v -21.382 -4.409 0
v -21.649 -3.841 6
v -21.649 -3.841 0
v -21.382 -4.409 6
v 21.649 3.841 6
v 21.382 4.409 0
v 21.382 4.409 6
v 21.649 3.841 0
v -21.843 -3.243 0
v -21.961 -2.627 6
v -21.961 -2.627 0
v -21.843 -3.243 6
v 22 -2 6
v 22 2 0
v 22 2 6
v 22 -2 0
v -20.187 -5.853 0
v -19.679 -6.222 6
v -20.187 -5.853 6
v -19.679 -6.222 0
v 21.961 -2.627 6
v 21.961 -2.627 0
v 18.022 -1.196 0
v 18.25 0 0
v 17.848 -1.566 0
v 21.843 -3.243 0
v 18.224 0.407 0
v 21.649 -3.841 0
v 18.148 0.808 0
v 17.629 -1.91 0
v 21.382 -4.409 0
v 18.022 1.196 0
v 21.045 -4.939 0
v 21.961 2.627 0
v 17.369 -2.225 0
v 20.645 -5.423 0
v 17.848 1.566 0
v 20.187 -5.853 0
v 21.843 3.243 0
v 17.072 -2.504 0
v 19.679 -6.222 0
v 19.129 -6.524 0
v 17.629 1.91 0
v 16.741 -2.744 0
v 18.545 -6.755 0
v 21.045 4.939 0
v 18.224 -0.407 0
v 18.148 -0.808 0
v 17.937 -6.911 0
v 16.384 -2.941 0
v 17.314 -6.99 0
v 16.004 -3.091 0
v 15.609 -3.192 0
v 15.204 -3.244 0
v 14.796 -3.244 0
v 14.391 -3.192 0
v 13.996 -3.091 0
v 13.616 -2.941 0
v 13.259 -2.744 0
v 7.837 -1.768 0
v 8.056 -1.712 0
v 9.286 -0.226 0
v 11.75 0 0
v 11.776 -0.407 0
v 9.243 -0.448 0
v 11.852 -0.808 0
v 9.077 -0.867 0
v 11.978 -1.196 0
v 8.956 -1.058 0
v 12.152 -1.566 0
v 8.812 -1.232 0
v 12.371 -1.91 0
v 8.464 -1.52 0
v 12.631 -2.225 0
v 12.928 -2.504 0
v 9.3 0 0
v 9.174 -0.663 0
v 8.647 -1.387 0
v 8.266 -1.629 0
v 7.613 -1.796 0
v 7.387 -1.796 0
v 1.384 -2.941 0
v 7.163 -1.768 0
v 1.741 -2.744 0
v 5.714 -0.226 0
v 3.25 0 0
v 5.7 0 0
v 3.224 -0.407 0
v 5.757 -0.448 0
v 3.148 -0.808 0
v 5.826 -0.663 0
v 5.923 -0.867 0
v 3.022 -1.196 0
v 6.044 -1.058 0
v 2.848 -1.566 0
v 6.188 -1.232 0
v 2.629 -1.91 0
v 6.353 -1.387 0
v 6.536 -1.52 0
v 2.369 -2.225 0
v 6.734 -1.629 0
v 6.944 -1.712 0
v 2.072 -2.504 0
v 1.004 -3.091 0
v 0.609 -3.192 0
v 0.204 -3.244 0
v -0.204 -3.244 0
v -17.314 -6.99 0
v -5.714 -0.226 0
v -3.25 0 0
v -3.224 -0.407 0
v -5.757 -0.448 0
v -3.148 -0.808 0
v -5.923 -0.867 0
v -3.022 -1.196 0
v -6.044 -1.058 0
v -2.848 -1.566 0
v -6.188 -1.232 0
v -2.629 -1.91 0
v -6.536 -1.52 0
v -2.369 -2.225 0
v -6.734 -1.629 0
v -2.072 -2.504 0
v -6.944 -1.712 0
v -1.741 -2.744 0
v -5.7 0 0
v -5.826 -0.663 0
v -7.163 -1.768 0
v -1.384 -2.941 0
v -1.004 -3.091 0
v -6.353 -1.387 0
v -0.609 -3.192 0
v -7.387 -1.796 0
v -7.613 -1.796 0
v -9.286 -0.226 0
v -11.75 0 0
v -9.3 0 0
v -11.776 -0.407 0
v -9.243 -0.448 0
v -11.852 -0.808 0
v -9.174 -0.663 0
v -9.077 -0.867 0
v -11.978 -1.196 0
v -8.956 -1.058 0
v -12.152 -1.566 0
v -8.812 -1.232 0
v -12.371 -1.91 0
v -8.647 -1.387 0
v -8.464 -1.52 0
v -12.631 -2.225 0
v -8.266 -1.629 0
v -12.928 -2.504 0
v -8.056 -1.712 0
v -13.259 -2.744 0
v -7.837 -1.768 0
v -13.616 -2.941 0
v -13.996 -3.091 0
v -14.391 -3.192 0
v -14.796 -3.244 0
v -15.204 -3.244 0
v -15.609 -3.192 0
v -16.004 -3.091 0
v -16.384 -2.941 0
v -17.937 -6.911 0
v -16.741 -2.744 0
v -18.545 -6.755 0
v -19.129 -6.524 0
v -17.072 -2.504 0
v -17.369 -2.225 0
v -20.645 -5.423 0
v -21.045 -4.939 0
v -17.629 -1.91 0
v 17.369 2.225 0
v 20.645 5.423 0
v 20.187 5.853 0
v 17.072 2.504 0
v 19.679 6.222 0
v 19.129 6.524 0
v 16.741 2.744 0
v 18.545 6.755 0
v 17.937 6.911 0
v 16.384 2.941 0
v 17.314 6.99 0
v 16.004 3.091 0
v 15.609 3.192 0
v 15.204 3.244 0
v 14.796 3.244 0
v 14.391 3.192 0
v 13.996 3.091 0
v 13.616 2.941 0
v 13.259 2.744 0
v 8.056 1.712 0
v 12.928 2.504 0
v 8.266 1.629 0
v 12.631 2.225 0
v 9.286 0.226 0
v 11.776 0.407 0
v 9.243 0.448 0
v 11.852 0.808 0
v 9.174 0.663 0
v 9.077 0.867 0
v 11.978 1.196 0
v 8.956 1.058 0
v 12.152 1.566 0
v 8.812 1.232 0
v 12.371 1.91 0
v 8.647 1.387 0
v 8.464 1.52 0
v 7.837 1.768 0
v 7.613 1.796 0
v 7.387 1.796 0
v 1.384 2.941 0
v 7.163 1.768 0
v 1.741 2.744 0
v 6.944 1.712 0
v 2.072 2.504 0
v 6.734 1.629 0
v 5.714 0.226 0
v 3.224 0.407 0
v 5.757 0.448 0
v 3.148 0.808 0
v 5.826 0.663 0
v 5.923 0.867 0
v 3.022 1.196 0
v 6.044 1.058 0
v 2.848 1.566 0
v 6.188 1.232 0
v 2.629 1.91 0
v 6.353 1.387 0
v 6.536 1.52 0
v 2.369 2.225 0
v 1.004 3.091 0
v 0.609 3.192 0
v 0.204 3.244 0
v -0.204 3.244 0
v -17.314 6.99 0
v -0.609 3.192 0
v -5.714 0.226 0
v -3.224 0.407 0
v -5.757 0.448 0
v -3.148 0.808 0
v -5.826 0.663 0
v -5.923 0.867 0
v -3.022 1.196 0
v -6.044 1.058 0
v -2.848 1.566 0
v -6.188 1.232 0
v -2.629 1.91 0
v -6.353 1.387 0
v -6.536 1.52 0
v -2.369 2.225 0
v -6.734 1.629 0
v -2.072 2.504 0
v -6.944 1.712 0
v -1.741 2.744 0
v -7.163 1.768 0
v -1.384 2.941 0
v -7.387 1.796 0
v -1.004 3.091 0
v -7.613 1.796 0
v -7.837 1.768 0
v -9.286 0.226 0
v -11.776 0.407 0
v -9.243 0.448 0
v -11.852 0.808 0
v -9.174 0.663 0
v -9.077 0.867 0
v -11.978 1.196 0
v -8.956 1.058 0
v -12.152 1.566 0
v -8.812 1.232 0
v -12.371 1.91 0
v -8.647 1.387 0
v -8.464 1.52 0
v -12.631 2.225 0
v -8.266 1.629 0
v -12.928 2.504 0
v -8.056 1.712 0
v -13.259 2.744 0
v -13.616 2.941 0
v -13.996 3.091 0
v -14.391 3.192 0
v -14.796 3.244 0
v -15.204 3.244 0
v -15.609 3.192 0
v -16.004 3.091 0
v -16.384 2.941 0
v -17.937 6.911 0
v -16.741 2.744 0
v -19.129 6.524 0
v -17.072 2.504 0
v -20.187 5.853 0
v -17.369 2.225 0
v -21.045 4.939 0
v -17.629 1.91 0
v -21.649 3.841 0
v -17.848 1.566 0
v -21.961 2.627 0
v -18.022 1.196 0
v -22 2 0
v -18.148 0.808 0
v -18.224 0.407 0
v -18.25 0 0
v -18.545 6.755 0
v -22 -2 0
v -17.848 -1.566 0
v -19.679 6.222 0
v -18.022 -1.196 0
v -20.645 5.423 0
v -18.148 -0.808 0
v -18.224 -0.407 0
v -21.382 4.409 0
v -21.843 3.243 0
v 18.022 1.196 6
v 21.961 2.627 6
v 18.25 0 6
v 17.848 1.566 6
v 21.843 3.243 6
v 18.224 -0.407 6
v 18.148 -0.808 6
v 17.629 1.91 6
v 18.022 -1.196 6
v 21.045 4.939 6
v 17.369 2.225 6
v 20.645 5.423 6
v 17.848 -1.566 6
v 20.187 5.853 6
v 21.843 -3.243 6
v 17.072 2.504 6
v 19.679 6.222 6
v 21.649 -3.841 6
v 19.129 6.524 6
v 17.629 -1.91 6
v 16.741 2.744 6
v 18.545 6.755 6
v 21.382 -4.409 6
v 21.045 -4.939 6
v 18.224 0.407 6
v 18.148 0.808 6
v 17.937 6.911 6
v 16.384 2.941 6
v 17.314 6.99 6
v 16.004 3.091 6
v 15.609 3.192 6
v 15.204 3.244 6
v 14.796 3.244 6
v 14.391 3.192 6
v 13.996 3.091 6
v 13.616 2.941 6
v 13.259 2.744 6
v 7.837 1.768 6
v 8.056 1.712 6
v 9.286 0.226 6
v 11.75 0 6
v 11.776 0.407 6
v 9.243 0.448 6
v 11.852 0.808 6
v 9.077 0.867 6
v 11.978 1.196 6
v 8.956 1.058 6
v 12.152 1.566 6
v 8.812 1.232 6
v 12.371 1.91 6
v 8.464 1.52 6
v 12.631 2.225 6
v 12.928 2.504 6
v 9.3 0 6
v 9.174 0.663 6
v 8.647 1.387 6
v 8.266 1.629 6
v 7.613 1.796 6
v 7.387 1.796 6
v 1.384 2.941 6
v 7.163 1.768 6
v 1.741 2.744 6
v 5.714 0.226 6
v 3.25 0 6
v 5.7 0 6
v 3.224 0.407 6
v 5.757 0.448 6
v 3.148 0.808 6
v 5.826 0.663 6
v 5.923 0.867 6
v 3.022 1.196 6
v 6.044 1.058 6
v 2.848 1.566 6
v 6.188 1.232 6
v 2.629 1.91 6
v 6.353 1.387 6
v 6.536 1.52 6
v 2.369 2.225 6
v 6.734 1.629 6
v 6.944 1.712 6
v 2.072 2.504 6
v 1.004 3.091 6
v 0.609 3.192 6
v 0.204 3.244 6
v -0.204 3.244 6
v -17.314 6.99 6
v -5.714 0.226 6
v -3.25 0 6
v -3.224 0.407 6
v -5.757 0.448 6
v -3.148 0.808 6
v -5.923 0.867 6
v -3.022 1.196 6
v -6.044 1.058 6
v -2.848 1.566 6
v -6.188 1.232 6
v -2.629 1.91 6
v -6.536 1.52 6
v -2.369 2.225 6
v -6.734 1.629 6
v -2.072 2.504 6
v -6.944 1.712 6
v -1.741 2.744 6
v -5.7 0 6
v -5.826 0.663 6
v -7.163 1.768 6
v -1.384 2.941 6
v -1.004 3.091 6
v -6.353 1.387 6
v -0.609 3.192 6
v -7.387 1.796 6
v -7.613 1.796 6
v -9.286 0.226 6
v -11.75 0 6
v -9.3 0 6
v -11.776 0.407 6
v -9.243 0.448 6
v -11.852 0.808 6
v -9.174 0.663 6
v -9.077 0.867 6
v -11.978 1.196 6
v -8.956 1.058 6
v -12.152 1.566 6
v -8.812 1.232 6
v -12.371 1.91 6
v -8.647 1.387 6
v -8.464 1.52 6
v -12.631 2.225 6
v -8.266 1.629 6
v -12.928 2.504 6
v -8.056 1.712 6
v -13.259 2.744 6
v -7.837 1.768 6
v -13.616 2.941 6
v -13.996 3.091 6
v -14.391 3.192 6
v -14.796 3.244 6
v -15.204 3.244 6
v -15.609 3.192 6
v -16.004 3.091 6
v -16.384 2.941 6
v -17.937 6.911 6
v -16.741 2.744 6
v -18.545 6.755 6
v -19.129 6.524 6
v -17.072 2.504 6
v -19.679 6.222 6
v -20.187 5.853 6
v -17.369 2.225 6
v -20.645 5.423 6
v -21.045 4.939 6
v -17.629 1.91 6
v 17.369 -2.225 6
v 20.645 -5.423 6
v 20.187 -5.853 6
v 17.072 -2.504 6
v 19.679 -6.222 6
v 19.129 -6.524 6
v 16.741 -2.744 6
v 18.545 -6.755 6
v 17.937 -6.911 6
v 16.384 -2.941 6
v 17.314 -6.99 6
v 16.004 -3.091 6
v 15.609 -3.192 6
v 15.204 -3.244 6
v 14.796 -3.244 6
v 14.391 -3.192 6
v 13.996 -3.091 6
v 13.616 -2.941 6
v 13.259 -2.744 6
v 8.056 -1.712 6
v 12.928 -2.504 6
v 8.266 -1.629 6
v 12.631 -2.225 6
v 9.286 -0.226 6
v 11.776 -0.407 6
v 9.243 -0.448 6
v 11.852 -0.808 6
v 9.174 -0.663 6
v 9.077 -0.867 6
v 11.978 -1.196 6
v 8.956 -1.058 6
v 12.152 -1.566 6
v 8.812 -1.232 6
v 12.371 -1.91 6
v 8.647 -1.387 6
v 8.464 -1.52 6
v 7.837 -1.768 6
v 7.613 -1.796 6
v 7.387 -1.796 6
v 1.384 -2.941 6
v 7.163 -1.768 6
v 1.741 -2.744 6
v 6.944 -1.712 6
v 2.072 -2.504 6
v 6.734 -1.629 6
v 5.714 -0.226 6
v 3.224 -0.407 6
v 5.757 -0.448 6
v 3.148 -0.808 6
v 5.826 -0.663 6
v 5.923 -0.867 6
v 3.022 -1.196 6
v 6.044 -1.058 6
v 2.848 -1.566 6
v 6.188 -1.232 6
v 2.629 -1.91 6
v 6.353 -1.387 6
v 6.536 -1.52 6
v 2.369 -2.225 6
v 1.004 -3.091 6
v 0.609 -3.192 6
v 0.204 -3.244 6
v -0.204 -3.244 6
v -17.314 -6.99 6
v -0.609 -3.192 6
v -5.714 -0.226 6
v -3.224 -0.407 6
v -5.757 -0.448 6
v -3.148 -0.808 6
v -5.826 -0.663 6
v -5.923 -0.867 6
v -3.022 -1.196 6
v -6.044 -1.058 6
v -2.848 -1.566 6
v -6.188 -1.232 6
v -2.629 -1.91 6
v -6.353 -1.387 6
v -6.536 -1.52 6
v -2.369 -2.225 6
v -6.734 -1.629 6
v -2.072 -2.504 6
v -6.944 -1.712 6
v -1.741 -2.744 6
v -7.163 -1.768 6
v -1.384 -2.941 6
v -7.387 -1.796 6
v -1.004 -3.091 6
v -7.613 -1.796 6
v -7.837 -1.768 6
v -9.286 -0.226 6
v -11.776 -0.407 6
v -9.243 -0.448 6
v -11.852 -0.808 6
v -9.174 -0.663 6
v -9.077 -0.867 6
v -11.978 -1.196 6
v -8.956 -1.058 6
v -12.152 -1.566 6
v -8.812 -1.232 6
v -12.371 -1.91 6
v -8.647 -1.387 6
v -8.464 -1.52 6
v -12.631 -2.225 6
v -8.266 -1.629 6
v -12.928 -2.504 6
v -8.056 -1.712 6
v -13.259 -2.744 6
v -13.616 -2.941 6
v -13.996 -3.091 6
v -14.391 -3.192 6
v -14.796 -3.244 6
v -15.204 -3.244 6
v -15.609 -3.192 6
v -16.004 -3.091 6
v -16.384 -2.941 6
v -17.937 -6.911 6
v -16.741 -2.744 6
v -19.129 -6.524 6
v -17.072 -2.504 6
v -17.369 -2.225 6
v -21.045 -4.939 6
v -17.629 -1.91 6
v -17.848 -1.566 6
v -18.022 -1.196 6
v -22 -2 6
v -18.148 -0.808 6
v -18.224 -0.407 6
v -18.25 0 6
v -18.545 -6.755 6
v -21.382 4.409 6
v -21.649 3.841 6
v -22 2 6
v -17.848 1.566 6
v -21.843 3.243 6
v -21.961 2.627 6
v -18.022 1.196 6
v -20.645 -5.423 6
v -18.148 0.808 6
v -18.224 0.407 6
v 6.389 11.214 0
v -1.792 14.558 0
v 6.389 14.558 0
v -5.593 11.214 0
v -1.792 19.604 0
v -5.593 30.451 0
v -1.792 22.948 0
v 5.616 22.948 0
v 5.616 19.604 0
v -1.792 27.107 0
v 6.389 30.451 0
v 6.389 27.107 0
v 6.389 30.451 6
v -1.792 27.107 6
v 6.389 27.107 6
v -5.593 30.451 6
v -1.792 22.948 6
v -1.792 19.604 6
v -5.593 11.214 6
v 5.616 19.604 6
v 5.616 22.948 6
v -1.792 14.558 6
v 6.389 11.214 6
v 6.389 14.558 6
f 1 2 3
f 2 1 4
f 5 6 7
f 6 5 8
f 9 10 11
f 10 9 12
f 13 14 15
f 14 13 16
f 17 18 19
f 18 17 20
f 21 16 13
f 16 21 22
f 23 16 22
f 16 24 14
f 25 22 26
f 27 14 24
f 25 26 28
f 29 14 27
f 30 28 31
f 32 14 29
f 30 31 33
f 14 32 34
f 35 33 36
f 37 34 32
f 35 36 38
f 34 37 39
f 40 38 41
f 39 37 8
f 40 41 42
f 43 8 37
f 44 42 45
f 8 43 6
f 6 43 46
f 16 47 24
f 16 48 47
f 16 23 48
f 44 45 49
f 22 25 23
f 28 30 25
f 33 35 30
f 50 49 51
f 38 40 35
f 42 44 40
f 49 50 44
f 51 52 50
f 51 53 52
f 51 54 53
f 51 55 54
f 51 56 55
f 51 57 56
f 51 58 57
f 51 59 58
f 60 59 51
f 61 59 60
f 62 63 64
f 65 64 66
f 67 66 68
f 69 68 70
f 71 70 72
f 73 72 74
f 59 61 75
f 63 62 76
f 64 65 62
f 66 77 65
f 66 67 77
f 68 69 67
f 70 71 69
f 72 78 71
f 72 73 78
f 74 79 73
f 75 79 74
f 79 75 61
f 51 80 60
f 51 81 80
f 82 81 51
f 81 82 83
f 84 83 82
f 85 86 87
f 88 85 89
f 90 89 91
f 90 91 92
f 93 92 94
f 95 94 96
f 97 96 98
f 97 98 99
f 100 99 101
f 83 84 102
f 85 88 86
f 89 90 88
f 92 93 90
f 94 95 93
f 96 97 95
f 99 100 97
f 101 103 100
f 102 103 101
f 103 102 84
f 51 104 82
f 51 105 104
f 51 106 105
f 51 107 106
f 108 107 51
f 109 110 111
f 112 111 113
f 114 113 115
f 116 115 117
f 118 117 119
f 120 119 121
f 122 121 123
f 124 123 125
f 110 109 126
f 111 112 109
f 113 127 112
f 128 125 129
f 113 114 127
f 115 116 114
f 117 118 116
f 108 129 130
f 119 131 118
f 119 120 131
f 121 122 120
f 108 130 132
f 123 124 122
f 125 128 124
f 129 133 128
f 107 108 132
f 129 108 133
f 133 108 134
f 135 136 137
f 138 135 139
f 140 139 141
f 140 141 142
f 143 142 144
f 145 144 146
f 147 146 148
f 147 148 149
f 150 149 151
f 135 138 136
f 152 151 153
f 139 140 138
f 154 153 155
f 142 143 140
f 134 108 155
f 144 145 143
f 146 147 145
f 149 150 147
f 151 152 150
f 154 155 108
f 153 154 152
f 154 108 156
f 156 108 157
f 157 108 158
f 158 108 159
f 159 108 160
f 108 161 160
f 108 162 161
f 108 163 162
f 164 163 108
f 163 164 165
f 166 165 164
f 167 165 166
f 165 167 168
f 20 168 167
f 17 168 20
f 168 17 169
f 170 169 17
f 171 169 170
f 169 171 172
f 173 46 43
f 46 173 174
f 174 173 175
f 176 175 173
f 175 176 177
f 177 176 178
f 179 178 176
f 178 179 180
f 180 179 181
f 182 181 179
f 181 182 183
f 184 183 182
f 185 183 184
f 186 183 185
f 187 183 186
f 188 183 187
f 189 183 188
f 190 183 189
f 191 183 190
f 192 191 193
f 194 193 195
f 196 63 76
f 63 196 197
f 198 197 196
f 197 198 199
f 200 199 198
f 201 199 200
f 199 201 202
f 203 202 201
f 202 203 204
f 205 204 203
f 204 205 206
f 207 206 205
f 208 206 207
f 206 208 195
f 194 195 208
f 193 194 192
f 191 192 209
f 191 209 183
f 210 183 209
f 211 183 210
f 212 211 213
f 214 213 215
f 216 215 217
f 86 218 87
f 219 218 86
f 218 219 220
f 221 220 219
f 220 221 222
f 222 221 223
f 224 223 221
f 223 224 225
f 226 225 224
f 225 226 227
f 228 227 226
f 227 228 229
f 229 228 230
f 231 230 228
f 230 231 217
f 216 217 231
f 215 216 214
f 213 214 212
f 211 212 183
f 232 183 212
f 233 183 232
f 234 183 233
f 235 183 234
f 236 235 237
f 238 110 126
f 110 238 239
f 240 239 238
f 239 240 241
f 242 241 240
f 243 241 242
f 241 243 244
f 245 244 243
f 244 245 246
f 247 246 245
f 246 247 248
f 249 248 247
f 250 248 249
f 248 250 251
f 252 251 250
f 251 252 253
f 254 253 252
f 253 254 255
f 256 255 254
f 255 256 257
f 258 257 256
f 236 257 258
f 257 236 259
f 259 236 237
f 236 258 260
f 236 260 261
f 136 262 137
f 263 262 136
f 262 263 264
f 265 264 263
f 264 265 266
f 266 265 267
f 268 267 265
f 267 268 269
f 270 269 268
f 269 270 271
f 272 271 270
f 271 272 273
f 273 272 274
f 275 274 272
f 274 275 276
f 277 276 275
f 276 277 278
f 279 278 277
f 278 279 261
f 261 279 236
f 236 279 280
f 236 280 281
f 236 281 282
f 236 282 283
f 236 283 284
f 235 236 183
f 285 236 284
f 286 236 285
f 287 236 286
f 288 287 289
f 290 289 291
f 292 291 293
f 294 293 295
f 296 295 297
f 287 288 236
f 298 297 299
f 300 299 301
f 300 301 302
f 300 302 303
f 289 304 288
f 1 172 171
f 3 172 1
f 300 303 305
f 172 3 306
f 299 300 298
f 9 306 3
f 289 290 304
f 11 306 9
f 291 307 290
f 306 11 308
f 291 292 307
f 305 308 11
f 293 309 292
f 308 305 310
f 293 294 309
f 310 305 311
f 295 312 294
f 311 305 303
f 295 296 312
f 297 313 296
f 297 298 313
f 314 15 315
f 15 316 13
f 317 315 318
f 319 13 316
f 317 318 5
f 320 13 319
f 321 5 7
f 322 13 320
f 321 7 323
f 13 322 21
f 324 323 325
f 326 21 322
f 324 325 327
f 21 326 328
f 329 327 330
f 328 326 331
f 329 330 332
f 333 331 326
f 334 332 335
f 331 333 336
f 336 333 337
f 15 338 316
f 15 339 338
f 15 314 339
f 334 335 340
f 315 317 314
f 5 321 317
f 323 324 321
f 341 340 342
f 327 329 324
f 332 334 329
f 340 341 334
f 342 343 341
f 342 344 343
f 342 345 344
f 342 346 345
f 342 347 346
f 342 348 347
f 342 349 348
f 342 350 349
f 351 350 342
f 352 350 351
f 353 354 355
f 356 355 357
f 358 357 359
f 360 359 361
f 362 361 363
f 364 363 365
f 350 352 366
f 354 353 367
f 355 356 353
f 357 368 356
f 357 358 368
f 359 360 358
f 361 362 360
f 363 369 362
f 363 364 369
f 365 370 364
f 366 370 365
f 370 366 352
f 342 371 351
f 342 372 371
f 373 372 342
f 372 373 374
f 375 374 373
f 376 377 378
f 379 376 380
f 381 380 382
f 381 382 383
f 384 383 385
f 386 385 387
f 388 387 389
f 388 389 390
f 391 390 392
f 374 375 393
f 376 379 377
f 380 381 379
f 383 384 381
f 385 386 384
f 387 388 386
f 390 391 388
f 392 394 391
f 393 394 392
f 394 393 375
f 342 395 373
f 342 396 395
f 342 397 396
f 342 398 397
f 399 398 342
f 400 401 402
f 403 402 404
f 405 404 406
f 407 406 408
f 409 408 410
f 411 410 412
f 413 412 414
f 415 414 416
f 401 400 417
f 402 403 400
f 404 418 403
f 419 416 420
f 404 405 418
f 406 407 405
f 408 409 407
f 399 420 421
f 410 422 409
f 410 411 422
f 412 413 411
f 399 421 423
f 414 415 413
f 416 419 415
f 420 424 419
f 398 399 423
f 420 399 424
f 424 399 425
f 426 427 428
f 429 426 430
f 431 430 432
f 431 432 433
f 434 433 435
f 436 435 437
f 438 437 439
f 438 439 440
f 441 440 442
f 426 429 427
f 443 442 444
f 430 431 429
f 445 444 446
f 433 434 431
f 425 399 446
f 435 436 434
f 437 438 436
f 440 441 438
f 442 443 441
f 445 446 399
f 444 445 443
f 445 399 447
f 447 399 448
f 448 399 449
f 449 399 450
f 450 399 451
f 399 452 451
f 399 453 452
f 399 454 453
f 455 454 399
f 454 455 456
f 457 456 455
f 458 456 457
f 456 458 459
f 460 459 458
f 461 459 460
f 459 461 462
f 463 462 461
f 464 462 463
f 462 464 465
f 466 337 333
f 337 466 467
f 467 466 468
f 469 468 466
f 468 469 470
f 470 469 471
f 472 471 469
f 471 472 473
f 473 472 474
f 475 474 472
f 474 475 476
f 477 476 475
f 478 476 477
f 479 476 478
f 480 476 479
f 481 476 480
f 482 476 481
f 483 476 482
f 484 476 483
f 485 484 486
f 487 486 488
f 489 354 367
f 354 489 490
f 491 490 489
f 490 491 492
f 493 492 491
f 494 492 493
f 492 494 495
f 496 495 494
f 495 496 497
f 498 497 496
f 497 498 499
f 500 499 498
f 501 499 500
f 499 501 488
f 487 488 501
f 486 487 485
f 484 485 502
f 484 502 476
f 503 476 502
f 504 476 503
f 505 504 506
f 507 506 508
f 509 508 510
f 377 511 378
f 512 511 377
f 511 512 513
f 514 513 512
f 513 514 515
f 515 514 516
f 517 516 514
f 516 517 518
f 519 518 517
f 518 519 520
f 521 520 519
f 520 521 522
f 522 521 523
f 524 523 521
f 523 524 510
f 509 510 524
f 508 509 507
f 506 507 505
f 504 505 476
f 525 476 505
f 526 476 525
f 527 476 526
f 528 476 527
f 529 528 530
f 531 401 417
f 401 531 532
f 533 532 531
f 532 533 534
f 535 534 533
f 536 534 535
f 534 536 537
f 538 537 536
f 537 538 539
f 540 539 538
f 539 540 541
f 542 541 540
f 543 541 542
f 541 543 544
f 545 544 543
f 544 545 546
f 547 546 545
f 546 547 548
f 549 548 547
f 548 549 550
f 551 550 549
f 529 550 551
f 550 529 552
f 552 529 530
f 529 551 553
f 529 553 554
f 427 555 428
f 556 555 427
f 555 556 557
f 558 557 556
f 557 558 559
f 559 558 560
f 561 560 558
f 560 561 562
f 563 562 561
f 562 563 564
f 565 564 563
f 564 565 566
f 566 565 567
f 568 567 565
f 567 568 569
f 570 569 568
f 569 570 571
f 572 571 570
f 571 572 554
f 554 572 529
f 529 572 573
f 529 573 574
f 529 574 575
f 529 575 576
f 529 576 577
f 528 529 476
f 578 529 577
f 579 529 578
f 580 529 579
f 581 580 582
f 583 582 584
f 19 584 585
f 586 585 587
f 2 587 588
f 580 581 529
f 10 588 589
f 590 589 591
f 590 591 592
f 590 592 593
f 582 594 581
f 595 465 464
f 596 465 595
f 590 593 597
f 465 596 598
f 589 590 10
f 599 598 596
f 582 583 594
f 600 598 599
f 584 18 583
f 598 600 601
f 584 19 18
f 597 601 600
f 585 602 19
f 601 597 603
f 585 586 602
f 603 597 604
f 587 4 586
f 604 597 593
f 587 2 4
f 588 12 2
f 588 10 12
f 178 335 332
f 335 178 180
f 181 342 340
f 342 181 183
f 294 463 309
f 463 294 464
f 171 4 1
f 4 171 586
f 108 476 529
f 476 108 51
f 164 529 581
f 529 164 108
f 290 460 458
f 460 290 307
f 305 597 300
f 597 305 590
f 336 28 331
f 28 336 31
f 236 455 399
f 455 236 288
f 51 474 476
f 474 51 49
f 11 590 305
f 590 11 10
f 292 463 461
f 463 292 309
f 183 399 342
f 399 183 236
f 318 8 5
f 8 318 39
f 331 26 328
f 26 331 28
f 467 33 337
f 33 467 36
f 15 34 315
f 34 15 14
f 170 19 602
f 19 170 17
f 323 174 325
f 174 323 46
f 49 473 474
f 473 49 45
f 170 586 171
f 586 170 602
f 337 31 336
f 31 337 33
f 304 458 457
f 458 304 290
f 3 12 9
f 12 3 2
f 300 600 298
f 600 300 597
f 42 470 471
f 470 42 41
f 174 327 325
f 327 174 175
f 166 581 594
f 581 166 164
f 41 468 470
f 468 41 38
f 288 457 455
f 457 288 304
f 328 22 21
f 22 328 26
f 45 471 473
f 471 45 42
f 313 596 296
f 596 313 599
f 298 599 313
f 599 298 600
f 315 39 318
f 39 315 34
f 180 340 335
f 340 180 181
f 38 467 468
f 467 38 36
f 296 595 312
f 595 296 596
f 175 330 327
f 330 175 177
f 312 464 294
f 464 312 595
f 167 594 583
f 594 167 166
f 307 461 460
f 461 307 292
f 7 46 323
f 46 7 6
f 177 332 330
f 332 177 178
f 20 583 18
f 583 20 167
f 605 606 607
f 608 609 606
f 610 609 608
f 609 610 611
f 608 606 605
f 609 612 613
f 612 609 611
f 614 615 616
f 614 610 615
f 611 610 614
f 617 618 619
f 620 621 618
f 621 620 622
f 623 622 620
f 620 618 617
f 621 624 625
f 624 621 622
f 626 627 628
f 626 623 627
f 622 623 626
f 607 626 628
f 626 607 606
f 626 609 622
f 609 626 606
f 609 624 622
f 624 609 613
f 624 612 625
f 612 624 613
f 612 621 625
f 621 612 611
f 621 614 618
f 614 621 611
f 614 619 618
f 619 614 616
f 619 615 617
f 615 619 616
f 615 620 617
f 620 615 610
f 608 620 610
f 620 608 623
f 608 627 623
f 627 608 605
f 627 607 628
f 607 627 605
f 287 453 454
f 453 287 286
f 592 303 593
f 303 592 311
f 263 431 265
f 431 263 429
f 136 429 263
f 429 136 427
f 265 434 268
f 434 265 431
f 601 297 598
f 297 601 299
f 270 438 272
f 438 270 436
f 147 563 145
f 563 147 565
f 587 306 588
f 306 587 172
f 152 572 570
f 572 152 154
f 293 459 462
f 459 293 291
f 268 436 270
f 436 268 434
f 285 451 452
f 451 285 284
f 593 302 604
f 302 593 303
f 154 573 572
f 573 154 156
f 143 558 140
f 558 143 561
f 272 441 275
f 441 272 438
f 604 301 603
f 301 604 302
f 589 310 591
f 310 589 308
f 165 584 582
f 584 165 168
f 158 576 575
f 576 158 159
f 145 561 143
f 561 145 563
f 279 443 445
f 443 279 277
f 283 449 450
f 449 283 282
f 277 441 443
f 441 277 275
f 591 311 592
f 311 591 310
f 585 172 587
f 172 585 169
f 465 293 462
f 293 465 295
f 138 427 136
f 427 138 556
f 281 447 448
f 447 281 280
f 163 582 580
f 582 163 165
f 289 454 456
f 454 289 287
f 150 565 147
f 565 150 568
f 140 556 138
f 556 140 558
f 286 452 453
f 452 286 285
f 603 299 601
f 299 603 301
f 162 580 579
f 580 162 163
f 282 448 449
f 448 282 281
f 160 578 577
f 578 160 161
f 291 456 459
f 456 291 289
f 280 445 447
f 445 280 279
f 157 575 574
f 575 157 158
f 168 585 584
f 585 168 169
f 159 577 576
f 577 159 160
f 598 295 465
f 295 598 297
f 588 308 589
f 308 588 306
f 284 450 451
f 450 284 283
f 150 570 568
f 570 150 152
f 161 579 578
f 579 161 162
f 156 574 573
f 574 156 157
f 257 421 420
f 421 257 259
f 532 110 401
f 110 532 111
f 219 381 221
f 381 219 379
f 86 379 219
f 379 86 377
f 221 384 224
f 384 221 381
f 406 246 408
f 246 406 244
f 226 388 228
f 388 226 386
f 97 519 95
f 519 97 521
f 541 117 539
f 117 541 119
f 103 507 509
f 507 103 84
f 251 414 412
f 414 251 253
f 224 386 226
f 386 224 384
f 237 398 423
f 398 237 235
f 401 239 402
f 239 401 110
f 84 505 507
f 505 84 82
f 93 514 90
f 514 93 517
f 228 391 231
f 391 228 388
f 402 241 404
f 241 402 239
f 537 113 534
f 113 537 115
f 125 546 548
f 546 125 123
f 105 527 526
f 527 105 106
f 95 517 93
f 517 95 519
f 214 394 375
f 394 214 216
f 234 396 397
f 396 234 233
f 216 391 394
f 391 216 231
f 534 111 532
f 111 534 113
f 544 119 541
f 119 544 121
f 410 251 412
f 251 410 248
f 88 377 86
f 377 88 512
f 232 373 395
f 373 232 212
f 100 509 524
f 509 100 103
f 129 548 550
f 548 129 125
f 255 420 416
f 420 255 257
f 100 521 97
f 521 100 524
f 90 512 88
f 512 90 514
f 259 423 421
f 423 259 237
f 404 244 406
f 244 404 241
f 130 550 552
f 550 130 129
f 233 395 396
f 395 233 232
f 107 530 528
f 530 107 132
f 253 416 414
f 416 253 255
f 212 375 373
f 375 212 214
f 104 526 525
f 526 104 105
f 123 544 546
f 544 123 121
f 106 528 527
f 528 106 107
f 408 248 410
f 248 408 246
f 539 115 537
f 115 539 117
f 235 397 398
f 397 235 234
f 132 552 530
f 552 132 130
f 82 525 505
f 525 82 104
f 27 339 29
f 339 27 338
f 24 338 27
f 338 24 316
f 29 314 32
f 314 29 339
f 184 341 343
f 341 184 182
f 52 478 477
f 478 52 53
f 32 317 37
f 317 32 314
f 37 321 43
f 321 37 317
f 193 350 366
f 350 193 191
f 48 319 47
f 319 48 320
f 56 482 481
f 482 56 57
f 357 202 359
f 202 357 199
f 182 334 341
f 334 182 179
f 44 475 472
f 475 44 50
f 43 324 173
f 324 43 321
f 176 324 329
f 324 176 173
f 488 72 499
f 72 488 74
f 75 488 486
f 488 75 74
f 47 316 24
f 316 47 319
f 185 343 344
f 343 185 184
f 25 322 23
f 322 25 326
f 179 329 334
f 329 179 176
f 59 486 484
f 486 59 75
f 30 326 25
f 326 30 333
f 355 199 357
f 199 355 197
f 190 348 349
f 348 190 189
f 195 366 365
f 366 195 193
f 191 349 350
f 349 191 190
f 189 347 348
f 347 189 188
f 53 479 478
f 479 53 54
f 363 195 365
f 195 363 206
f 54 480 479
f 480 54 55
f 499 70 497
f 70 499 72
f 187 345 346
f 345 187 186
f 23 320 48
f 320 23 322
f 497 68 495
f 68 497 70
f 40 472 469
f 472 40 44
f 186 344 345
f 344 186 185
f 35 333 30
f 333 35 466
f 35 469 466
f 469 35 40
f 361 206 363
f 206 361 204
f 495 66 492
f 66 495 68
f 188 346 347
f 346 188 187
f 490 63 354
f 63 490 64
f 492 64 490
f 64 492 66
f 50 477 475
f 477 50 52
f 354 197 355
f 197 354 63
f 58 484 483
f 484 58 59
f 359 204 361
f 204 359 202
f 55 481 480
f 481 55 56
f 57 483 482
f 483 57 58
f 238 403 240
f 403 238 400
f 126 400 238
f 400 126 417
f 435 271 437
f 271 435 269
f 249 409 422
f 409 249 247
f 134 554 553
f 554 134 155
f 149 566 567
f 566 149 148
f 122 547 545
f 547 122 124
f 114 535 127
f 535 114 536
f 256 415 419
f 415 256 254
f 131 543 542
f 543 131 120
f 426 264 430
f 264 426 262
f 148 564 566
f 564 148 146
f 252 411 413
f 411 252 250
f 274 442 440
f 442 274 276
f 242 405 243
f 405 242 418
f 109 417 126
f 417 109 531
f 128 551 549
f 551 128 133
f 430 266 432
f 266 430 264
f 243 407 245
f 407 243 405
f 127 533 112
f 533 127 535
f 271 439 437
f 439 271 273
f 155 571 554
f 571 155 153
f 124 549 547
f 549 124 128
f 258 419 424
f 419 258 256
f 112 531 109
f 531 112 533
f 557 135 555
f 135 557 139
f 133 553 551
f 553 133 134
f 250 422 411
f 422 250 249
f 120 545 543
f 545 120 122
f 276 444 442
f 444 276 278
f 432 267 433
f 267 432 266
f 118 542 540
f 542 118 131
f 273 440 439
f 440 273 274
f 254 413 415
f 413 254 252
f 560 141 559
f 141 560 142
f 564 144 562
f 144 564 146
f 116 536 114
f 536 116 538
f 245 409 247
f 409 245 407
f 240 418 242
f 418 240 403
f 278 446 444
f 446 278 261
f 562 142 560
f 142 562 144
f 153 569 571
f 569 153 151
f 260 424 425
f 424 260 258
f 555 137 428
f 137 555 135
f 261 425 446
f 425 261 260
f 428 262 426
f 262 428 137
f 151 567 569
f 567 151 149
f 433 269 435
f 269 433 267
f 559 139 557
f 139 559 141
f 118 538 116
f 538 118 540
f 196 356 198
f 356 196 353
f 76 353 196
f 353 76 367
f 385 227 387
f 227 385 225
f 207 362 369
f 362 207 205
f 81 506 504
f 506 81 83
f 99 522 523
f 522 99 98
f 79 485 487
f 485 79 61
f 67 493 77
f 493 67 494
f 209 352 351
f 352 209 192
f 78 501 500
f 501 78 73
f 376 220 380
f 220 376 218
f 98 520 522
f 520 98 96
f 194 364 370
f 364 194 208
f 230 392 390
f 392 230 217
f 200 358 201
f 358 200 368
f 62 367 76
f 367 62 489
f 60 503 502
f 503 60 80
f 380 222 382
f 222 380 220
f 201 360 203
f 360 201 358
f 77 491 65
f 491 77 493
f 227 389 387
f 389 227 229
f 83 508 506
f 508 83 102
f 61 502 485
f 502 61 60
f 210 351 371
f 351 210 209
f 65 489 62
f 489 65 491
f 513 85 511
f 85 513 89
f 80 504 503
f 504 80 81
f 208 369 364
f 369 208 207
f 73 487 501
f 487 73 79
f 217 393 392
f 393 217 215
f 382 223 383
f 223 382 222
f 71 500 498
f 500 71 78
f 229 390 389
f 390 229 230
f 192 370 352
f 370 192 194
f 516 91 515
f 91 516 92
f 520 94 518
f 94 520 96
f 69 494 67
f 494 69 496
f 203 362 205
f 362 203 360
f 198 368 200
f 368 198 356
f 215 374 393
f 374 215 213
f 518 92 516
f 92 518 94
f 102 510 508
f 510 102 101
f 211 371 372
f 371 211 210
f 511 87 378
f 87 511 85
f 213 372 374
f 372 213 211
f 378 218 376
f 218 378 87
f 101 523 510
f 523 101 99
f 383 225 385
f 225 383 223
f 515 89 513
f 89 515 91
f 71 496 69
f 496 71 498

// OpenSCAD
$fn = 50;


difference() {
	union() {
		hull() {
			translate(v = [-17.0000000000, 2.0000000000, 0]) {
				cylinder(h = 6, r = 5);
			}
			translate(v = [17.0000000000, 2.0000000000, 0]) {
				cylinder(h = 6, r = 5);
			}
			translate(v = [-17.0000000000, -2.0000000000, 0]) {
				cylinder(h = 6, r = 5);
			}
			translate(v = [17.0000000000, -2.0000000000, 0]) {
				cylinder(h = 6, r = 5);
			}
		}
		translate(v = [0, 30.0000000000, 0]) {
			linear_extrude(height = 6) {
				text(font = "DejaVu Sans Mono:style=Bold", halign = "center", size = 19.0000000000, text = "E", valign = "top");
			}
		}
	}
	union() {
		translate(v = [-15.0000000000, 0.0000000000, 0]) {
			translate(v = [0, 0, -100]) {
				cylinder(h = 200, r = 3.2500000000);
			}
		}
		translate(v = [0, 0, -100]) {
			cylinder(h = 200, r = 3.2500000000);
		}
		translate(v = [15.0000000000, 0.0000000000, 0]) {
			translate(v = [0, 0, -100]) {
				cylinder(h = 200, r = 3.2500000000);
			}
		}
		translate(v = [-15.0000000000, 0.0000000000, 0]) {
			translate(v = [0, 0, -100]) {
				cylinder(h = 200, r = 1.8000000000);
			}
		}
		translate(v = [-7.5000000000, 0.0000000000, 0]) {
			translate(v = [0, 0, -100]) {
				cylinder(h = 200, r = 1.8000000000);
			}
		}
		translate(v = [0, 0, -100]) {
			cylinder(h = 200, r = 1.8000000000);
		}
		translate(v = [7.5000000000, 0.0000000000, 0]) {
			translate(v = [0, 0, -100]) {
				cylinder(h = 200, r = 1.8000000000);
			}
		}
		translate(v = [15.0000000000, 0.0000000000, 0]) {
			translate(v = [0, 0, -100]) {
				cylinder(h = 200, r = 1.8000000000);
			}
		}
	}
}
